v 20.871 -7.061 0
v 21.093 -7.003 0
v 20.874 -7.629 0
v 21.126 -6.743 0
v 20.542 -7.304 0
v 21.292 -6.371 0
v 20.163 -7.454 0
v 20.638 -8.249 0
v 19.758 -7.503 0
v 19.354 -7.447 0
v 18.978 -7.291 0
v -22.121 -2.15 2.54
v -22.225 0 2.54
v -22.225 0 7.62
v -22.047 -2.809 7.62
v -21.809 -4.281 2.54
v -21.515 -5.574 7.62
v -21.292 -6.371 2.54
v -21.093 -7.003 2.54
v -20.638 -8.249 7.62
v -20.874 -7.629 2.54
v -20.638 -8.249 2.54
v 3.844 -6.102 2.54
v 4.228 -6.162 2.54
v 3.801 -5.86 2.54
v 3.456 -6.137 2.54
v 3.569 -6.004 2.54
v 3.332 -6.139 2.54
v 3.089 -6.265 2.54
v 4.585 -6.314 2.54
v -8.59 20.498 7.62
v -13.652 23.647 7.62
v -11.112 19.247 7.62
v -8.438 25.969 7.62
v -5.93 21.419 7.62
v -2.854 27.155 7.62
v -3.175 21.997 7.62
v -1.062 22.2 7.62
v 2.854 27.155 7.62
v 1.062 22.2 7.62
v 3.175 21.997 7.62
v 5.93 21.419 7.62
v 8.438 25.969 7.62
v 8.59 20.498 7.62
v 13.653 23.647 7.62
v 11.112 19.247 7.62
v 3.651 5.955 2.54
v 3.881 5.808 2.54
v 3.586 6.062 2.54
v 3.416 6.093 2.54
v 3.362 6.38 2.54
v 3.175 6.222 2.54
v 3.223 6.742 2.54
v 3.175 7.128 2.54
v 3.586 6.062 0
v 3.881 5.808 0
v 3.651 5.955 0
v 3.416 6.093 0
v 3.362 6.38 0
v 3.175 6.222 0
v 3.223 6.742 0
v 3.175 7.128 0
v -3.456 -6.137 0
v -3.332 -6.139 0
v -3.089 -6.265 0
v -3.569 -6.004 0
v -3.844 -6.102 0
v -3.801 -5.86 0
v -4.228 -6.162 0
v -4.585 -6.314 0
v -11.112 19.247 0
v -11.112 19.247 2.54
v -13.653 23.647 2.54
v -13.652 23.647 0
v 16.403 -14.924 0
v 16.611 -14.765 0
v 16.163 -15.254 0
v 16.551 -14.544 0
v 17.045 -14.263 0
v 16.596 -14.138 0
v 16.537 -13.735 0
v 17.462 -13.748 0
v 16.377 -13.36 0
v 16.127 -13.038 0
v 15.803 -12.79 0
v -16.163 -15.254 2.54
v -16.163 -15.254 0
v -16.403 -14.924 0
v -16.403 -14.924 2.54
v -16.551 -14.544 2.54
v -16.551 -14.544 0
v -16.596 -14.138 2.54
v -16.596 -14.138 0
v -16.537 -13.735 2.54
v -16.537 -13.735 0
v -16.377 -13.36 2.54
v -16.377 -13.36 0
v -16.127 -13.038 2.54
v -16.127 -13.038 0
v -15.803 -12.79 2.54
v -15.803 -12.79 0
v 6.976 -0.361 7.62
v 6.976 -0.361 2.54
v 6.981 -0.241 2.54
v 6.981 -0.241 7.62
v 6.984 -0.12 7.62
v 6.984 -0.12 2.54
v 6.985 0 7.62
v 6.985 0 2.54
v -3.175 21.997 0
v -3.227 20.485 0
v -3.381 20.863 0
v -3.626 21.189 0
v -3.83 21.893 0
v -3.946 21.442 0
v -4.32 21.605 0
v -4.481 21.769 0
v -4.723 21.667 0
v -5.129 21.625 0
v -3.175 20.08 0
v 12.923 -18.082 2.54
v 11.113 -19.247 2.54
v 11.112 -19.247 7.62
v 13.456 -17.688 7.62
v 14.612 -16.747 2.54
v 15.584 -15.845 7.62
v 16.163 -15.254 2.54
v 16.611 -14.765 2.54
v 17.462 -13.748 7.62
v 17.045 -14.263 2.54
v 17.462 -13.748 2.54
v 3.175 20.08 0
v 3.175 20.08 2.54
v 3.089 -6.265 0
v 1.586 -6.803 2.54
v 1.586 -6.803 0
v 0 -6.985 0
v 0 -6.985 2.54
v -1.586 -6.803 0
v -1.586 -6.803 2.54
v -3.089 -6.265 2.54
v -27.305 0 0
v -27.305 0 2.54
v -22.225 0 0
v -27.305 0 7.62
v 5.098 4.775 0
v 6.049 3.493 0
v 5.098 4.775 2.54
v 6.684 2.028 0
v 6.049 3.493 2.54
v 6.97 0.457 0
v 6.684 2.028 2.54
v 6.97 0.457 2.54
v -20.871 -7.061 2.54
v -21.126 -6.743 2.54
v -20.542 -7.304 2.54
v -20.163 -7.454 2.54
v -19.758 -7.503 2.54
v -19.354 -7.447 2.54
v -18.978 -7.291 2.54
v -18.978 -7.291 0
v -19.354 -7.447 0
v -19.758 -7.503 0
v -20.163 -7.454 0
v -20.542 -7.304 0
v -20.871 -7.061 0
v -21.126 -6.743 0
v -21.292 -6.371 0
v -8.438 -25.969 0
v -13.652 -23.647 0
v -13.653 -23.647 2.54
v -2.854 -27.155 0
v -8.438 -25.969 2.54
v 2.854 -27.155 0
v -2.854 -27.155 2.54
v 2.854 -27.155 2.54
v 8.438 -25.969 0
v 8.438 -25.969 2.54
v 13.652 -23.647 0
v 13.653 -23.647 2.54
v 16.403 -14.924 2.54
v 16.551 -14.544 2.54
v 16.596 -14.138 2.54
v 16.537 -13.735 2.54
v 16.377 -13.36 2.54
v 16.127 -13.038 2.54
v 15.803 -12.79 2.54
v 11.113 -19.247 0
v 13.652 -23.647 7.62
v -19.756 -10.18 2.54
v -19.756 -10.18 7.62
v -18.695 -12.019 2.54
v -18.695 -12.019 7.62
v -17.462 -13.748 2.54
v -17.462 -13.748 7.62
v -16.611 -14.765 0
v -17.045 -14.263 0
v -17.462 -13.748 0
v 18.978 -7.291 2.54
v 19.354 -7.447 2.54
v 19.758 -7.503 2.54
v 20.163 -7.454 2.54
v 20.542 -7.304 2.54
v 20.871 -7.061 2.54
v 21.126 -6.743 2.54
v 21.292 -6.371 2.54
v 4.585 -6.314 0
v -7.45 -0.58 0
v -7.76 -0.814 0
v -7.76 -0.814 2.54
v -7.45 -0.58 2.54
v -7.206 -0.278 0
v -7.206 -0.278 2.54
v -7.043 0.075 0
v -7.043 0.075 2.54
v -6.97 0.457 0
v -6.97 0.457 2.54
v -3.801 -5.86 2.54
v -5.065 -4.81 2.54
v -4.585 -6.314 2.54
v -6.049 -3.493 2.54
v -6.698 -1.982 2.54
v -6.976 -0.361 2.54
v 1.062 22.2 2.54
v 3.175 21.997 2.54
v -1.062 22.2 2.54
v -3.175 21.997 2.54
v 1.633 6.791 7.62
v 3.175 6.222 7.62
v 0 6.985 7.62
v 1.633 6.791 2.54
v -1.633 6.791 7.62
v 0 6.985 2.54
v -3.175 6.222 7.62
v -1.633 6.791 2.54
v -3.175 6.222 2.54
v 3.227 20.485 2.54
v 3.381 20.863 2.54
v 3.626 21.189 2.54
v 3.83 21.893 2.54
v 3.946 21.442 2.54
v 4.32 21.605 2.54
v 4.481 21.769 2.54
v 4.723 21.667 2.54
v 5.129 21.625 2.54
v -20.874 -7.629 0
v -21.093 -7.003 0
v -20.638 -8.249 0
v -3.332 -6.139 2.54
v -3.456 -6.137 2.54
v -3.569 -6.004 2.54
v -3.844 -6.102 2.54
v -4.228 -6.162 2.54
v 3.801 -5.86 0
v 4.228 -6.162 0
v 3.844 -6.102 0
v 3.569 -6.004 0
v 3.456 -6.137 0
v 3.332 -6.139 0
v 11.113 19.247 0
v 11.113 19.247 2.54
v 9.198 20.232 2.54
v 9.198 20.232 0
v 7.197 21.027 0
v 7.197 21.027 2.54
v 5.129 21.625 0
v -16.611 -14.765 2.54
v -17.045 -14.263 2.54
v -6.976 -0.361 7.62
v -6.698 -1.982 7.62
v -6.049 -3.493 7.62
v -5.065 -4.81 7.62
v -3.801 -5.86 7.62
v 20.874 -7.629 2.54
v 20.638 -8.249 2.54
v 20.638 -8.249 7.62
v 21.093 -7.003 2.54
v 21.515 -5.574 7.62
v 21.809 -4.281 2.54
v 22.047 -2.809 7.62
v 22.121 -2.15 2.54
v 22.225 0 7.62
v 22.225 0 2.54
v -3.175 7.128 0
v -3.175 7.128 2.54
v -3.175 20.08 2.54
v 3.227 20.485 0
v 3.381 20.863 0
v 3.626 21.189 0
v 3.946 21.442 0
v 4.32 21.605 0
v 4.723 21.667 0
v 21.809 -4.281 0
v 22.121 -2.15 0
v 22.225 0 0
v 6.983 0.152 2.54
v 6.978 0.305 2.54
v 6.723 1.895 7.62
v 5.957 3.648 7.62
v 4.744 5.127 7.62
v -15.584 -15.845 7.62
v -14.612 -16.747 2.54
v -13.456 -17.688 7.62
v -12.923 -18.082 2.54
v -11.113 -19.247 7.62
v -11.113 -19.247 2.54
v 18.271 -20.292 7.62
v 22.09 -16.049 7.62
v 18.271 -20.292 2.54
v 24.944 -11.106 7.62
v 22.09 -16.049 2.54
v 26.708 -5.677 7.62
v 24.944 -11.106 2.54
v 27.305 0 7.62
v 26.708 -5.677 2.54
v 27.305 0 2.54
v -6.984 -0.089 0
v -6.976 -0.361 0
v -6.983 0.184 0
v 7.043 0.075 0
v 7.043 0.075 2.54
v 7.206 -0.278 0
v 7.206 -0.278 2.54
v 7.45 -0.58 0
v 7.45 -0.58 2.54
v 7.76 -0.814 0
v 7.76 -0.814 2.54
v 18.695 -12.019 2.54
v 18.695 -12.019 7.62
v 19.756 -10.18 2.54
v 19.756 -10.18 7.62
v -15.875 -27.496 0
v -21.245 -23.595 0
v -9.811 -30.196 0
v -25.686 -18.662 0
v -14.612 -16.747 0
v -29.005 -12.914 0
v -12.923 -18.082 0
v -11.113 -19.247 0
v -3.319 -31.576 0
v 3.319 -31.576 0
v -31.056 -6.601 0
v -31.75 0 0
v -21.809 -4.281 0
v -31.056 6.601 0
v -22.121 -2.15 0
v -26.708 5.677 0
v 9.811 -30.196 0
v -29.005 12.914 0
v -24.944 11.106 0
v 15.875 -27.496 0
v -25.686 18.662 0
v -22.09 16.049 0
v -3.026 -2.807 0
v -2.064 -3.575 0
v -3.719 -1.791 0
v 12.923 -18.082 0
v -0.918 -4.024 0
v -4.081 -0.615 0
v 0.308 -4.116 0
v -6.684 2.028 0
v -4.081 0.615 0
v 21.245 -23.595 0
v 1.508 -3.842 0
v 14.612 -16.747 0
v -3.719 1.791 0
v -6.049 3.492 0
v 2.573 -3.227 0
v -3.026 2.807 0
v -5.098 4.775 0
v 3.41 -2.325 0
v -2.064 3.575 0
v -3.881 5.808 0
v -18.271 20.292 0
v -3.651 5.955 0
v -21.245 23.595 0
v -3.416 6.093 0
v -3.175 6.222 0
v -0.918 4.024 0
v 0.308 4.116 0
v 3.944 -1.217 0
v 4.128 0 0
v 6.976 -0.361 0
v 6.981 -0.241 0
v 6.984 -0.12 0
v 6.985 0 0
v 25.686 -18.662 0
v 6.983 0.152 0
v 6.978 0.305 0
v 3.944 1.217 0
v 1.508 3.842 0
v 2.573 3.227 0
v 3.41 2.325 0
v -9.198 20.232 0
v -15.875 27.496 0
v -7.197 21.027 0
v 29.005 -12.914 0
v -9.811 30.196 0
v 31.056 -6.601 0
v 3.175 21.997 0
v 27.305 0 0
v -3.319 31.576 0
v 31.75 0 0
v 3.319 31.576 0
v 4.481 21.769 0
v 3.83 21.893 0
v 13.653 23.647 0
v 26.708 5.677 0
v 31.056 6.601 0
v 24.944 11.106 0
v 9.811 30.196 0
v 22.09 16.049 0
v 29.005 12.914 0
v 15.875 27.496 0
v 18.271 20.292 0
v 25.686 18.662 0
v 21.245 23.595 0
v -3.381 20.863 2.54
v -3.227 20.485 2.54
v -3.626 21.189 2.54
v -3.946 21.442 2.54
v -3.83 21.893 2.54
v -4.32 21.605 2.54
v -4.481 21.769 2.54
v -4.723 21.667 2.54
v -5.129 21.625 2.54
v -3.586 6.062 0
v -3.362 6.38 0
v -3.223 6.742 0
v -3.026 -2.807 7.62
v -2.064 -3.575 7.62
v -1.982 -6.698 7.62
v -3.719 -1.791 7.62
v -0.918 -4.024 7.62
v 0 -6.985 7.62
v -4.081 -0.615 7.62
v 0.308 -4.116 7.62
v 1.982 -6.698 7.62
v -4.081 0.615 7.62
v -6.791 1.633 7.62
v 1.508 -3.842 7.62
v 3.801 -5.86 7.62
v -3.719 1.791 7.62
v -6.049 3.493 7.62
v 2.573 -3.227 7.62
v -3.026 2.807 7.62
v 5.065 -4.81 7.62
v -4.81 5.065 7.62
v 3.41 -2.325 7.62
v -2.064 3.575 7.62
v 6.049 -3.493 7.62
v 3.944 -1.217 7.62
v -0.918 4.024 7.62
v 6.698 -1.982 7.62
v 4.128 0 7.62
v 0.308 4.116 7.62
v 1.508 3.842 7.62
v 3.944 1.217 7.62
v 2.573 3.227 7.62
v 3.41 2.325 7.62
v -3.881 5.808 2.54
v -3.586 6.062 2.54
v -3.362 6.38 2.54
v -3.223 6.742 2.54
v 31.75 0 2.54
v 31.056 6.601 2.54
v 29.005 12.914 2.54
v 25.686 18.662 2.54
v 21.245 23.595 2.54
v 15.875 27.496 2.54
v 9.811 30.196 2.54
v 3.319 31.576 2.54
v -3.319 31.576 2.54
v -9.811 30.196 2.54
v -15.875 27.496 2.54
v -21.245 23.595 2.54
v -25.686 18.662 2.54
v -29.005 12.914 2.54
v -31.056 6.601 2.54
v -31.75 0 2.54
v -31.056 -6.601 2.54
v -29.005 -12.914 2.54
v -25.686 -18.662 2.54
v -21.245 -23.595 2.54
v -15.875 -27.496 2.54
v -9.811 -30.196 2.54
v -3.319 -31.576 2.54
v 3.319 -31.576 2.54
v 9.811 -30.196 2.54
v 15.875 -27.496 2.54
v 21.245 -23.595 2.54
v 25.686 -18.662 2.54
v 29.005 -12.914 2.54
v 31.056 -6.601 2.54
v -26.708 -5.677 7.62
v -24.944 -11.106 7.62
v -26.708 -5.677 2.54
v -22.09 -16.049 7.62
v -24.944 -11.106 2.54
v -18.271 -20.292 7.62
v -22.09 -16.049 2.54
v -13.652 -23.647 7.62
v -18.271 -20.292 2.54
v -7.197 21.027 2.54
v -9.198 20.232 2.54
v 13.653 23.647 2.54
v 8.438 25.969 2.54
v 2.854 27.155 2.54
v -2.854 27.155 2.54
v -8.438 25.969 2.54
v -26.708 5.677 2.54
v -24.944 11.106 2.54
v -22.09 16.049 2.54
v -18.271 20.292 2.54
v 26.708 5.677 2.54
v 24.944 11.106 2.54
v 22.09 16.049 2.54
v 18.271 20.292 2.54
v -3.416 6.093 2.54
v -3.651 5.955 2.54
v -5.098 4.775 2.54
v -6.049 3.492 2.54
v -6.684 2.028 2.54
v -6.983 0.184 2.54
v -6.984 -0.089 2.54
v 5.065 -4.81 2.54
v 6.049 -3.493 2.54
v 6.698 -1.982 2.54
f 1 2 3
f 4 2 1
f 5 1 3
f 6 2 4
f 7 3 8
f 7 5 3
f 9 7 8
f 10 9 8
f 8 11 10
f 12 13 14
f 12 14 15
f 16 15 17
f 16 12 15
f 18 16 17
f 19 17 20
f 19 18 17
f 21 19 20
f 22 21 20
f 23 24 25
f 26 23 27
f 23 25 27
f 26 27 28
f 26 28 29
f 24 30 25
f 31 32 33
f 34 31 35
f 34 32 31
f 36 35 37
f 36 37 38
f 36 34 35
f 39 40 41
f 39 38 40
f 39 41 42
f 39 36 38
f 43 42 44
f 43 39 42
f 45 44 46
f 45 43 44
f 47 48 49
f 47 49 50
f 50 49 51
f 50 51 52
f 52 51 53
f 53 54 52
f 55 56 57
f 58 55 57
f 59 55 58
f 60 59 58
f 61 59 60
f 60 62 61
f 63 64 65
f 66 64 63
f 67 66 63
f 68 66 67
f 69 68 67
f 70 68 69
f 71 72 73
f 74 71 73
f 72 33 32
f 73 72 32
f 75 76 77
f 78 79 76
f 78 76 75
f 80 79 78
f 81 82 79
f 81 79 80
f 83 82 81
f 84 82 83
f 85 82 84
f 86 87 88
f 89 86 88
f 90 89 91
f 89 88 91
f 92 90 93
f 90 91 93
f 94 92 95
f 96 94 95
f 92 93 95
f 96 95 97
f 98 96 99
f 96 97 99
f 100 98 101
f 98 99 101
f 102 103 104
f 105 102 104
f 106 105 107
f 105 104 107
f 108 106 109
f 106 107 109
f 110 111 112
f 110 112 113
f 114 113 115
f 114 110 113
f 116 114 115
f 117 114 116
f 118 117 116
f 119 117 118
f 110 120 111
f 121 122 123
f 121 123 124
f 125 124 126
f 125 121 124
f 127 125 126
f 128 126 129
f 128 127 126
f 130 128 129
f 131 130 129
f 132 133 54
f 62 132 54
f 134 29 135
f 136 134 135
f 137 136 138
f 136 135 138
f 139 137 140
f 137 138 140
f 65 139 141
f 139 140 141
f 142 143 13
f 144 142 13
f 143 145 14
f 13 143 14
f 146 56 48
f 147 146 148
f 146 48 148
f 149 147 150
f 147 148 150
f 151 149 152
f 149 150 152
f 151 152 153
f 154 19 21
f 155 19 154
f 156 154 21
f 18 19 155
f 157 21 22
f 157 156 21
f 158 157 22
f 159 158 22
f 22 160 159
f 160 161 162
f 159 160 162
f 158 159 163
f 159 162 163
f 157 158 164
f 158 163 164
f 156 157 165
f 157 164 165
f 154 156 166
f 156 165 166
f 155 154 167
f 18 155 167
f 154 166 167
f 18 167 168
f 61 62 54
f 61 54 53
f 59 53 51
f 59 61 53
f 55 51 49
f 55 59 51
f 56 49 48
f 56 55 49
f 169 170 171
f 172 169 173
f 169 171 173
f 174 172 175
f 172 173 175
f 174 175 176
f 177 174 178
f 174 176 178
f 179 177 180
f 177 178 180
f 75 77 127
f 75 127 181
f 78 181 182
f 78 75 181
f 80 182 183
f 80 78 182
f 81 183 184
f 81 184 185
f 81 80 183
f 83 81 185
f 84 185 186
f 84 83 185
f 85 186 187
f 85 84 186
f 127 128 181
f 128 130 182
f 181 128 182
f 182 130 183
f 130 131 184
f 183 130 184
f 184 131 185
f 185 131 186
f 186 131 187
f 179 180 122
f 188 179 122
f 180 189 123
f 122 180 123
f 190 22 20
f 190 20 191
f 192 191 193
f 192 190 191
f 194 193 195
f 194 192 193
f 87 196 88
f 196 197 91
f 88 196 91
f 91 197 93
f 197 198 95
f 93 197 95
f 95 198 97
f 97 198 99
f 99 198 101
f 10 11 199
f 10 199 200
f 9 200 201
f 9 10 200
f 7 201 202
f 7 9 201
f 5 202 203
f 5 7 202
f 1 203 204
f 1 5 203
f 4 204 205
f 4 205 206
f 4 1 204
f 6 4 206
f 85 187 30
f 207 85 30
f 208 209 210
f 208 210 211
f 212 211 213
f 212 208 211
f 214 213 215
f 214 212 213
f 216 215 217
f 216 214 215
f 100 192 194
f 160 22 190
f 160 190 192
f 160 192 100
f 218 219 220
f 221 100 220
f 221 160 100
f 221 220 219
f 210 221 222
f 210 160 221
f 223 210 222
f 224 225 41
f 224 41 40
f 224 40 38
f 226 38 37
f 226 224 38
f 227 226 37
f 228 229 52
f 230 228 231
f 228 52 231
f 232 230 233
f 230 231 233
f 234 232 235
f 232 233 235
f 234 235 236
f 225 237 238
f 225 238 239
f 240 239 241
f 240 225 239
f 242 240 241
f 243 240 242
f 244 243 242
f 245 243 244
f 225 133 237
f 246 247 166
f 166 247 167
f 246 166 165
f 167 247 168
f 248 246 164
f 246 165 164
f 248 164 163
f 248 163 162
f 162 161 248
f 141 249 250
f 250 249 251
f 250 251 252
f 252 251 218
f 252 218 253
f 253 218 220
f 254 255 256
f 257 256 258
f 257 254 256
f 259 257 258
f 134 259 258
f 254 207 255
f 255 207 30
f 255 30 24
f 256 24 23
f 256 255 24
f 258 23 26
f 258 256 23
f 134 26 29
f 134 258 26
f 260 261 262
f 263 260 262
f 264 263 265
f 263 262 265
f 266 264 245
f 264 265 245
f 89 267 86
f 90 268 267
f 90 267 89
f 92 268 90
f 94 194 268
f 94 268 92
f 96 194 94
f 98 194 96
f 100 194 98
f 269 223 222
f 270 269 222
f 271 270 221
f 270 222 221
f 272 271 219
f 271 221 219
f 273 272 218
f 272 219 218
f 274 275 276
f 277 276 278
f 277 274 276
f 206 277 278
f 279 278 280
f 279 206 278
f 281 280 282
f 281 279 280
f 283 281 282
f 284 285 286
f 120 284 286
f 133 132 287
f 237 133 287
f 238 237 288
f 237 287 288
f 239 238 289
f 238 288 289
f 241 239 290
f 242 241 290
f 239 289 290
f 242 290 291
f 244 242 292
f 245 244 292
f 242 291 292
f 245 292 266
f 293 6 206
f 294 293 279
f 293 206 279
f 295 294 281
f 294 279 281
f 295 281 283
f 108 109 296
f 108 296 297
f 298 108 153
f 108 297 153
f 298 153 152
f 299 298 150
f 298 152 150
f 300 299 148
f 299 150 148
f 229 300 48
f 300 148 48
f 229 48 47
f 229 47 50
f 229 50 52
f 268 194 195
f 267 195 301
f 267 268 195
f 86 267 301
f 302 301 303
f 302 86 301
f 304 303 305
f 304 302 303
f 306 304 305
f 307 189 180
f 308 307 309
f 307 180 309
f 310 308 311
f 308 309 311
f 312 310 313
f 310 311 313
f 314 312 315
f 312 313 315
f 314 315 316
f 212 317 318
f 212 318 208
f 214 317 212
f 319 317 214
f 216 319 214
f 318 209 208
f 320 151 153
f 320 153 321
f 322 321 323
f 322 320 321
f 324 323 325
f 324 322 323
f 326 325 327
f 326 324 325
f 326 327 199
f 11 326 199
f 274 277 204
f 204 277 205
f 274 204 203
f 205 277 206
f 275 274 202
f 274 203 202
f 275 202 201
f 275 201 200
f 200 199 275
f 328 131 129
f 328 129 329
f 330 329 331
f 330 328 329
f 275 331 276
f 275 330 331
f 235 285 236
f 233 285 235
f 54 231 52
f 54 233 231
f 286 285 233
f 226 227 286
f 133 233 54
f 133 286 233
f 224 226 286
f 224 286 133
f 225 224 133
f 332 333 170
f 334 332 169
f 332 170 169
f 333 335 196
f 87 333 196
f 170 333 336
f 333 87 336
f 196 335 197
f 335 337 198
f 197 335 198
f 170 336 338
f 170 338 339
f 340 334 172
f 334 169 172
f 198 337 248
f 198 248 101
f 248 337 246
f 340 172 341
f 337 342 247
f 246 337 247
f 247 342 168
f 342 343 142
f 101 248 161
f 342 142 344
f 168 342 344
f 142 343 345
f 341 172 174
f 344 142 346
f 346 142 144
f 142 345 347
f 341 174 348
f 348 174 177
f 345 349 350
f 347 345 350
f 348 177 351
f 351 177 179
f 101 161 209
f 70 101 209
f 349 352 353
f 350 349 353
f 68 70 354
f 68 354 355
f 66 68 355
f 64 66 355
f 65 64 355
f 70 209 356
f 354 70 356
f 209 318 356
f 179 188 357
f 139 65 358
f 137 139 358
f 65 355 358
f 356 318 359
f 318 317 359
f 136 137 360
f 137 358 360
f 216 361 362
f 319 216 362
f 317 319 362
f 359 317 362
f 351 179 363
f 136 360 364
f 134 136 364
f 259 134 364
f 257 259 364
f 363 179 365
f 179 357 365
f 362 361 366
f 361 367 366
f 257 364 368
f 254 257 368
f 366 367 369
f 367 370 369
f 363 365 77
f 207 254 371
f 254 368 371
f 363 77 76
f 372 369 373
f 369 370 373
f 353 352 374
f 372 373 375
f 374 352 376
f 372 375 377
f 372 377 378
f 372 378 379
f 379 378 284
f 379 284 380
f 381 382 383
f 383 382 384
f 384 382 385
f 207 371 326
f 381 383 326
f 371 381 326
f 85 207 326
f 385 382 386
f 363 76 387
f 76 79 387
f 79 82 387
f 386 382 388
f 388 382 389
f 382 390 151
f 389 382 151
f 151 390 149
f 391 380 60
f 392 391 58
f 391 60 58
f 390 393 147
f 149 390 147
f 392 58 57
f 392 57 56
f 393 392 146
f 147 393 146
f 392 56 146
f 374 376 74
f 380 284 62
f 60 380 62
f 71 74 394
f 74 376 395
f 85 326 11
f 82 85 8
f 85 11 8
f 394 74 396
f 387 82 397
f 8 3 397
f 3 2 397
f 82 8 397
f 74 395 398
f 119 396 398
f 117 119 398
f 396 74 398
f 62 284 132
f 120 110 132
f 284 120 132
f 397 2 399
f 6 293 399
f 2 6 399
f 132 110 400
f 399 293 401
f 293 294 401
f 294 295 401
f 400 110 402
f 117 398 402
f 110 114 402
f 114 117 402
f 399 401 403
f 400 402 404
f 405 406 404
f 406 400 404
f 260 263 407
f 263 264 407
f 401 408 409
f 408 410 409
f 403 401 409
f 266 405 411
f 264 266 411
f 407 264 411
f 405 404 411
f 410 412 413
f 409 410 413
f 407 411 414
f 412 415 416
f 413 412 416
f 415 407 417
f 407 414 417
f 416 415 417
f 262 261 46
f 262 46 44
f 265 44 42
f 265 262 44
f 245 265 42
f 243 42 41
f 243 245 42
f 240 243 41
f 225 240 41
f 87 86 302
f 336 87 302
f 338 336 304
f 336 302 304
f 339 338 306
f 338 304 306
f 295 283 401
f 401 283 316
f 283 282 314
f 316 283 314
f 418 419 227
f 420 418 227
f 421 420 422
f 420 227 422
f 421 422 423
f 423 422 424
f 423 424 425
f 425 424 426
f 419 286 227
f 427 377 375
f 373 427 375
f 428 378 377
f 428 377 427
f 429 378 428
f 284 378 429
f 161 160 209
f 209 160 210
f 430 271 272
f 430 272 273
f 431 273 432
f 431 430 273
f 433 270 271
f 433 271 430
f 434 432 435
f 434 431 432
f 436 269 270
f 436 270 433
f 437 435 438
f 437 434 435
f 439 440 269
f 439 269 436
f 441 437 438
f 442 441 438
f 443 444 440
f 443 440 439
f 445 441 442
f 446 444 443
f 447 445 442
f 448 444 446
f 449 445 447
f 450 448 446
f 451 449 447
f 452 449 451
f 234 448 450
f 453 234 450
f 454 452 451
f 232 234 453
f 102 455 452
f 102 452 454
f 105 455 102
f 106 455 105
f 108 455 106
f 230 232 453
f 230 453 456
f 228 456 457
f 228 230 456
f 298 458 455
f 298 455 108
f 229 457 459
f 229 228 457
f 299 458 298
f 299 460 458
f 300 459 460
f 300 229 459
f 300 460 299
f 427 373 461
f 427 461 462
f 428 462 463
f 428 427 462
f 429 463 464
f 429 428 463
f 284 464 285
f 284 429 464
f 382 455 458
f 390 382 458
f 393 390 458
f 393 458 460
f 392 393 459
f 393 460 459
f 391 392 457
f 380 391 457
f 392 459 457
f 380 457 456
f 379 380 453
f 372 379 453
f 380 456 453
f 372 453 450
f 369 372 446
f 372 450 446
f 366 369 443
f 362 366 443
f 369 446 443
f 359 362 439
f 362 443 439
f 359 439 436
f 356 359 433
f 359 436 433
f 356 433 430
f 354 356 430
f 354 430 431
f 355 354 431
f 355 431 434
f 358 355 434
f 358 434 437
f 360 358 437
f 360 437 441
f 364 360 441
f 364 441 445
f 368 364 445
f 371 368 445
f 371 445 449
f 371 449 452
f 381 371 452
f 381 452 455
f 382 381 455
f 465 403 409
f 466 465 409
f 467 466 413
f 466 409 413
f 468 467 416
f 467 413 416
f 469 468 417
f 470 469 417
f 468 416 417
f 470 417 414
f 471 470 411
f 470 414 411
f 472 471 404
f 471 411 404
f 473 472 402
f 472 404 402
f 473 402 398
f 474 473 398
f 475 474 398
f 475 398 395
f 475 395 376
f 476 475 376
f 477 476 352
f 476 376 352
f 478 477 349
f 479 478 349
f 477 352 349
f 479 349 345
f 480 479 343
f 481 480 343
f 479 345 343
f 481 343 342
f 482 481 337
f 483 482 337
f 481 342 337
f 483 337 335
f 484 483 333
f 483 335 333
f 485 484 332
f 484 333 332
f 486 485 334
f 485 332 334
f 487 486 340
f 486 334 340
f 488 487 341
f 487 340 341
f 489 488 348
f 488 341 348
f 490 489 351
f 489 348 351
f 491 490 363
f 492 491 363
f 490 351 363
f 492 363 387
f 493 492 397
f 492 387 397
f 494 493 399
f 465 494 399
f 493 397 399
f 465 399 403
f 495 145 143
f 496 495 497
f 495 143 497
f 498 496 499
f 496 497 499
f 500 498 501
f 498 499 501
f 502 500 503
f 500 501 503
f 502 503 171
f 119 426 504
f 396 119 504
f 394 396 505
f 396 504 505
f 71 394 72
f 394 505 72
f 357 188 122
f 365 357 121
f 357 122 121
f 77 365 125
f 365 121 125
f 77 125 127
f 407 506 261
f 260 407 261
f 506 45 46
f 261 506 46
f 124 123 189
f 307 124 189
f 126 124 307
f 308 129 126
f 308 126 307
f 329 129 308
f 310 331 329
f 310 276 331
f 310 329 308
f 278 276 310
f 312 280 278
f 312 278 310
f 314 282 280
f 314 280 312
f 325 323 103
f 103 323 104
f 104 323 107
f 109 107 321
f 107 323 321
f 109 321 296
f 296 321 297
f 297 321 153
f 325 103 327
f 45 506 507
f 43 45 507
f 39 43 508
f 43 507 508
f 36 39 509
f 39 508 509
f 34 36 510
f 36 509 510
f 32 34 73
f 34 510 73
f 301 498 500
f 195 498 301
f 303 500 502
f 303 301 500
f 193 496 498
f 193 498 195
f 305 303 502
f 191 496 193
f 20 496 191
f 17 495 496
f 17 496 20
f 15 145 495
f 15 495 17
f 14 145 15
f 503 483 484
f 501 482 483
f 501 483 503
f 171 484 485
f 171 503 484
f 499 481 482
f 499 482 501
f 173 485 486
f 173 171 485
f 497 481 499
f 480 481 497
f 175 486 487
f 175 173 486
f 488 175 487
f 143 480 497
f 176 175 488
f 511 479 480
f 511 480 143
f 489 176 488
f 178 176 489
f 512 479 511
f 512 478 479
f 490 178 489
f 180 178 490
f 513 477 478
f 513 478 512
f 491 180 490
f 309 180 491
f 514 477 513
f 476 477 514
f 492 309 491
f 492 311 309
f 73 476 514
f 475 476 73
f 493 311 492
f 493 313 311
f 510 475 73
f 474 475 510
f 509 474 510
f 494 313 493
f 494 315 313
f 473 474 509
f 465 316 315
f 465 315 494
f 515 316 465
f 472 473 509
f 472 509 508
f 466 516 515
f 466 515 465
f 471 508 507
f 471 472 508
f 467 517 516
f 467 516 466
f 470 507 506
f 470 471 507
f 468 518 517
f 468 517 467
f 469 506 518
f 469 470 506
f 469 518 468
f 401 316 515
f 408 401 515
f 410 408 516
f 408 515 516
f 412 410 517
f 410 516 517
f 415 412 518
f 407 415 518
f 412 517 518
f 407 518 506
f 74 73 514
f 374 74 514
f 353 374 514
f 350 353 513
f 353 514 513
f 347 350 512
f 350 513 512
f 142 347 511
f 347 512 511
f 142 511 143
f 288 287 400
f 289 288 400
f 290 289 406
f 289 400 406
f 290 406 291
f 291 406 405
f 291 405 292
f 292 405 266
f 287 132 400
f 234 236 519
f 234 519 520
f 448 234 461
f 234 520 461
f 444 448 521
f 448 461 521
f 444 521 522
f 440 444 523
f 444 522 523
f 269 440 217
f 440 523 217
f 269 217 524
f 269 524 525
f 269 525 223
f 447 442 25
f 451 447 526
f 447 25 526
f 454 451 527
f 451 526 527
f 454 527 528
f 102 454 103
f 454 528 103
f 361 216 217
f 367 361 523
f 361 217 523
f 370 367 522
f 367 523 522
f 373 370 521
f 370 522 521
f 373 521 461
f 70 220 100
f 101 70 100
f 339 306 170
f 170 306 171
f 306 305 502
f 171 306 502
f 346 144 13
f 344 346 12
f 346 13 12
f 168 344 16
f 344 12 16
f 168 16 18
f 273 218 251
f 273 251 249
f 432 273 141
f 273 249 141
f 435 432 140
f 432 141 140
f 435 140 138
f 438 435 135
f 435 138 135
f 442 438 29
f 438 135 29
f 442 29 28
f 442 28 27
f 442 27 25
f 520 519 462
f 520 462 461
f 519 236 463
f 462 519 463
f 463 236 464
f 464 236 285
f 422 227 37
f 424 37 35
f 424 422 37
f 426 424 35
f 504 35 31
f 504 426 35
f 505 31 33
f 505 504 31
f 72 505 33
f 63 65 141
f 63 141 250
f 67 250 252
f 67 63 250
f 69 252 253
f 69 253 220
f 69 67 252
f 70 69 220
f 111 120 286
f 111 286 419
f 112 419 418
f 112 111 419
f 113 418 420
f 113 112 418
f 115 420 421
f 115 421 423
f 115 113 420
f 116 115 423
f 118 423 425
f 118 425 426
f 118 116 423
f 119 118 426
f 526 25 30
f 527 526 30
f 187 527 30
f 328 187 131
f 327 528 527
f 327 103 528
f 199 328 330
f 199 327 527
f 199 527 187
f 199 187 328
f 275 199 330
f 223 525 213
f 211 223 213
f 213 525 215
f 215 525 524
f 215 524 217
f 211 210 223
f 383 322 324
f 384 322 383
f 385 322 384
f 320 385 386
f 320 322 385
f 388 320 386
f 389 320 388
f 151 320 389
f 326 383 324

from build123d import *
from build123d import SkipClean  # not in build123d's __all__

# Parameters (mm, degrees)
F0_R          = 31.75
F1_DEPTH      = 2.54
F2_R          = 27.305
F2_R_2        = 22.225
F2_R_3        = 6.985
F3_DEPTH      = 5.08
F4_R          = 4.1275
F5_DEPTH      = 25.4
F5_DEPTH_BACK = 96
F7_DEPTH      = 25.4
F7_DEPTH_BACK = 5.081
F8_T1_DEPTH   = 2.54
F10_DEPTH     = 25.4


# Not quite as in the source:
# - a fillet or chamfer that OpenCascade refuses, or shapes differently, is made with other operations: its cross-section is extruded or revolved along the edge and cut away or added
# - an extrude ends at something that could not be found from the text; its depth is read off the source's solid


with BuildPart() as f1:
    # F0 (on Top) → F1 (new body)
    with BuildSketch(Plane.XY):
        Circle(F0_R)
    extrude(amount=F1_DEPTH)

    # F2 (on face) → F3 (join)
    with BuildSketch(Plane.XY.offset(2.54)):
        Circle(F2_R)
        Circle(F2_R_2, mode=Mode.SUBTRACT)
        Circle(F2_R_3)
    extrude(amount=F3_DEPTH)

    # F4 (on face) → F5 (cut, two sides)
    with BuildSketch(Plane.XY.offset(7.62)) as f5_sk:
        Circle(F4_R)
    extrude(amount=-F5_DEPTH, mode=Mode.SUBTRACT)
    extrude(f5_sk.sketch, amount=F5_DEPTH_BACK, mode=Mode.SUBTRACT)

    # F6 (on face) → F7 (cut, two sides)
    with BuildSketch(Plane.XY.offset(2.54)) as f7_sk:
        with BuildLine():
            Line((3.175, 21.9970452561), (3.175, 6.2217039467))
            ThreePointArc((3.175, 6.2217039467), (5.956828015, 3.6477972806), (6.985, 0))
            ThreePointArc((6.985, 0), (6.9826630272, -0.1806711053), (6.9756536726, -0.3612213163))
            Line((6.9756536726, -0.3612213163), (20.6375, -8.248891971))
            ThreePointArc((20.6375, -8.248891971), (21.8245167472, -4.2001302063), (22.225, 0))
            ThreePointArc((22.225, 0), (16.8005208253, 14.5496778315), (3.175, 21.9970452561))
        make_face()
        with BuildLine():
            Line((17.4625, -13.7481532851), (3.8006536726, -5.8604826304))
            ThreePointArc((3.8006536726, -5.8604826304), (0, -6.985), (-3.8006536726, -5.8604826304))
            Line((-3.8006536726, -5.8604826304), (-17.4625, -13.7481532851))
            ThreePointArc((-17.4625, -13.7481532851), (0, -22.225), (17.4625, -13.7481532851))
        make_face()
        with BuildLine():
            ThreePointArc((-6.9756536726, -0.3612213163), (-6.0491874454, 3.4925), (-3.175, 6.2217039467))
            Line((-3.175, 6.2217039467), (-3.175, 21.9970452561))
            ThreePointArc((-3.175, 21.9970452561), (-19.2474145991, 11.1125), (-20.6375, -8.248891971))
            Line((-20.6375, -8.248891971), (-6.9756536726, -0.3612213163))
        make_face()
    with SkipClean():  # cleaning this boolean's faces spoils the solid; the shape is the same uncleaned
        extrude(amount=-F7_DEPTH, mode=Mode.SUBTRACT)
        extrude(f7_sk.sketch, amount=F7_DEPTH_BACK, mode=Mode.SUBTRACT)

    # F8: fillet of radius 1.5875 on 18 edges, made by hand

    # F8_s2 → F8_t1 (join)
    with BuildSketch(Plane.XY):
        with BuildLine():
            ThreePointArc((16.1634751393, -15.2542681378), (16.5796979287, -13.9347220137), (15.8026912008, -12.7898622281))
            Line((15.8026912008, -12.7898622281), (17.4625, -13.7481532851))
            ThreePointArc((17.4625, -13.7481532851), (16.829843924, -14.515749326), (16.1634751393, -15.2542681378))
        make_face()
        with BuildLine():
            ThreePointArc((18.9776912008, -7.290600914), (20.3576722229, -7.3910785865), (21.2923212932, -6.3708460152))
            ThreePointArc((21.2923212932, -6.3708460152), (20.9859296333, -7.3171977169), (20.6375, -8.248891971))
            Line((20.6375, -8.248891971), (18.9776912008, -7.290600914))
        make_face()
        with BuildLine():
            ThreePointArc((3.175, 20.0804631421), (3.7779742942, 21.3258006002), (5.1288461538, 21.625114153))
            ThreePointArc((5.1288461538, 21.625114153), (4.1560857093, 21.8329470429), (3.175, 21.9970452561))
            Line((3.175, 21.9970452561), (3.175, 20.0804631421))
        make_face()
        with BuildLine():
            ThreePointArc((-3.175, 20.0804631421), (-3.7779742942, 21.3258006002), (-5.1288461538, 21.625114153))
            ThreePointArc((-5.1288461538, 21.625114153), (-4.1560857093, 21.8329470429), (-3.175, 21.9970452561))
            Line((-3.175, 21.9970452561), (-3.175, 20.0804631421))
        make_face()
        with BuildLine():
            ThreePointArc((-18.9776912008, -7.290600914), (-20.3576722229, -7.3910785865), (-21.2923212932, -6.3708460152))
            ThreePointArc((-21.2923212932, -6.3708460152), (-20.9859296333, -7.3171977169), (-20.6375, -8.248891971))
            Line((-20.6375, -8.248891971), (-18.9776912008, -7.290600914))
        make_face()
        with BuildLine():
            ThreePointArc((-16.1634751393, -15.2542681378), (-16.5796979287, -13.9347220137), (-15.8026912008, -12.7898622281))
            Line((-15.8026912008, -12.7898622281), (-17.4625, -13.7481532851))
            ThreePointArc((-17.4625, -13.7481532851), (-16.829843924, -14.515749326), (-16.1634751393, -15.2542681378))
        make_face()
        with BuildLine():
            ThreePointArc((4.5854055152, -6.3135593179), (3.8435830552, -6.1017241554), (3.0894970865, -6.2646015638))
            ThreePointArc((3.0894970865, -6.2646015638), (3.4509958561, -6.0729607772), (3.8006536726, -5.8604826304))
            Line((3.8006536726, -5.8604826304), (4.5854055152, -6.3135593179))
        make_face()
        with BuildLine():
            ThreePointArc((-3.0894970865, -6.2646015638), (-3.8435830552, -6.1017241554), (-4.5854055152, -6.3135593179))
            Line((-4.5854055152, -6.3135593179), (-3.8006536726, -5.8604826304))
            ThreePointArc((-3.8006536726, -5.8604826304), (-3.4509958561, -6.0729607772), (-3.0894970865, -6.2646015638))
        make_face()
        with BuildLine():
            ThreePointArc((-7.7604055152, -0.8142980039), (-7.2060396531, -0.2777784896), (-6.970052642, 0.4567178201))
            ThreePointArc((-6.970052642, 0.4567178201), (-6.9848362373, 0.0478303088), (-6.9756536726, -0.3612213163))
            Line((-6.9756536726, -0.3612213163), (-7.7604055152, -0.8142980039))
        make_face()
        with BuildLine():
            ThreePointArc((-3.8805555556, 5.8078837437), (-3.3624565979, 6.379502645), (-3.175, 7.1278573218))
            Line((-3.175, 7.1278573218), (-3.175, 6.2217039467))
            ThreePointArc((-3.175, 6.2217039467), (-3.5338403812, 6.0251304683), (-3.8805555556, 5.8078837437))
        make_face()
        with BuildLine():
            ThreePointArc((3.175, 7.1278573218), (3.3624565979, 6.379502645), (3.8805555556, 5.8078837437))
            ThreePointArc((3.8805555556, 5.8078837437), (3.5338403812, 6.0251304683), (3.175, 6.2217039467))
            Line((3.175, 6.2217039467), (3.175, 7.1278573218))
        make_face()
        with BuildLine():
            ThreePointArc((6.970052642, 0.4567178201), (7.2060396531, -0.2777784896), (7.7604055152, -0.8142980039))
            Line((7.7604055152, -0.8142980039), (6.9756536726, -0.3612213163))
            ThreePointArc((6.9756536726, -0.3612213163), (6.9848362373, 0.0478303088), (6.970052642, 0.4567178201))
        make_face()
    with SkipClean():  # cleaning this boolean's faces spoils the solid; the shape is the same uncleaned
        extrude(amount=F8_T1_DEPTH)

    # F9 (on face) → F10 (cut)
    with BuildSketch(Plane.XY.offset(7.62)):
        with BuildLine():
            ThreePointArc((27.305, 0), (23.6468236503, 13.6525), (13.6525, 23.6468236503))
            Line((13.6525, 23.6468236503), (11.1125, 19.2474145991))
            ThreePointArc((11.1125, 19.2474145991), (19.2474145991, 11.1125), (22.225, 0))
            Line((22.225, 0), (27.305, 0))
        make_face()
        with BuildLine():
            Line((-11.1125, -19.2474145991), (-13.6525, -23.6468236503))
            ThreePointArc((-13.6525, -23.6468236503), (0, -27.305), (13.6525, -23.6468236503))
            Line((13.6525, -23.6468236503), (11.1125, -19.2474145991))
            ThreePointArc((11.1125, -19.2474145991), (0, -22.225), (-11.1125, -19.2474145991))
        make_face()
        with BuildLine():
            ThreePointArc((-22.225, 0), (-19.2474145991, 11.1125), (-11.1125, 19.2474145991))
            Line((-11.1125, 19.2474145991), (-13.6525, 23.6468236503))
            ThreePointArc((-13.6525, 23.6468236503), (-23.6468236503, 13.6525), (-27.305, 0))
            Line((-27.305, 0), (-22.225, 0))
        make_face()
    with SkipClean():  # cleaning this boolean's faces spoils the solid; the shape is the same uncleaned
        extrude(amount=-F10_DEPTH, mode=Mode.SUBTRACT)


solid = f1.part
